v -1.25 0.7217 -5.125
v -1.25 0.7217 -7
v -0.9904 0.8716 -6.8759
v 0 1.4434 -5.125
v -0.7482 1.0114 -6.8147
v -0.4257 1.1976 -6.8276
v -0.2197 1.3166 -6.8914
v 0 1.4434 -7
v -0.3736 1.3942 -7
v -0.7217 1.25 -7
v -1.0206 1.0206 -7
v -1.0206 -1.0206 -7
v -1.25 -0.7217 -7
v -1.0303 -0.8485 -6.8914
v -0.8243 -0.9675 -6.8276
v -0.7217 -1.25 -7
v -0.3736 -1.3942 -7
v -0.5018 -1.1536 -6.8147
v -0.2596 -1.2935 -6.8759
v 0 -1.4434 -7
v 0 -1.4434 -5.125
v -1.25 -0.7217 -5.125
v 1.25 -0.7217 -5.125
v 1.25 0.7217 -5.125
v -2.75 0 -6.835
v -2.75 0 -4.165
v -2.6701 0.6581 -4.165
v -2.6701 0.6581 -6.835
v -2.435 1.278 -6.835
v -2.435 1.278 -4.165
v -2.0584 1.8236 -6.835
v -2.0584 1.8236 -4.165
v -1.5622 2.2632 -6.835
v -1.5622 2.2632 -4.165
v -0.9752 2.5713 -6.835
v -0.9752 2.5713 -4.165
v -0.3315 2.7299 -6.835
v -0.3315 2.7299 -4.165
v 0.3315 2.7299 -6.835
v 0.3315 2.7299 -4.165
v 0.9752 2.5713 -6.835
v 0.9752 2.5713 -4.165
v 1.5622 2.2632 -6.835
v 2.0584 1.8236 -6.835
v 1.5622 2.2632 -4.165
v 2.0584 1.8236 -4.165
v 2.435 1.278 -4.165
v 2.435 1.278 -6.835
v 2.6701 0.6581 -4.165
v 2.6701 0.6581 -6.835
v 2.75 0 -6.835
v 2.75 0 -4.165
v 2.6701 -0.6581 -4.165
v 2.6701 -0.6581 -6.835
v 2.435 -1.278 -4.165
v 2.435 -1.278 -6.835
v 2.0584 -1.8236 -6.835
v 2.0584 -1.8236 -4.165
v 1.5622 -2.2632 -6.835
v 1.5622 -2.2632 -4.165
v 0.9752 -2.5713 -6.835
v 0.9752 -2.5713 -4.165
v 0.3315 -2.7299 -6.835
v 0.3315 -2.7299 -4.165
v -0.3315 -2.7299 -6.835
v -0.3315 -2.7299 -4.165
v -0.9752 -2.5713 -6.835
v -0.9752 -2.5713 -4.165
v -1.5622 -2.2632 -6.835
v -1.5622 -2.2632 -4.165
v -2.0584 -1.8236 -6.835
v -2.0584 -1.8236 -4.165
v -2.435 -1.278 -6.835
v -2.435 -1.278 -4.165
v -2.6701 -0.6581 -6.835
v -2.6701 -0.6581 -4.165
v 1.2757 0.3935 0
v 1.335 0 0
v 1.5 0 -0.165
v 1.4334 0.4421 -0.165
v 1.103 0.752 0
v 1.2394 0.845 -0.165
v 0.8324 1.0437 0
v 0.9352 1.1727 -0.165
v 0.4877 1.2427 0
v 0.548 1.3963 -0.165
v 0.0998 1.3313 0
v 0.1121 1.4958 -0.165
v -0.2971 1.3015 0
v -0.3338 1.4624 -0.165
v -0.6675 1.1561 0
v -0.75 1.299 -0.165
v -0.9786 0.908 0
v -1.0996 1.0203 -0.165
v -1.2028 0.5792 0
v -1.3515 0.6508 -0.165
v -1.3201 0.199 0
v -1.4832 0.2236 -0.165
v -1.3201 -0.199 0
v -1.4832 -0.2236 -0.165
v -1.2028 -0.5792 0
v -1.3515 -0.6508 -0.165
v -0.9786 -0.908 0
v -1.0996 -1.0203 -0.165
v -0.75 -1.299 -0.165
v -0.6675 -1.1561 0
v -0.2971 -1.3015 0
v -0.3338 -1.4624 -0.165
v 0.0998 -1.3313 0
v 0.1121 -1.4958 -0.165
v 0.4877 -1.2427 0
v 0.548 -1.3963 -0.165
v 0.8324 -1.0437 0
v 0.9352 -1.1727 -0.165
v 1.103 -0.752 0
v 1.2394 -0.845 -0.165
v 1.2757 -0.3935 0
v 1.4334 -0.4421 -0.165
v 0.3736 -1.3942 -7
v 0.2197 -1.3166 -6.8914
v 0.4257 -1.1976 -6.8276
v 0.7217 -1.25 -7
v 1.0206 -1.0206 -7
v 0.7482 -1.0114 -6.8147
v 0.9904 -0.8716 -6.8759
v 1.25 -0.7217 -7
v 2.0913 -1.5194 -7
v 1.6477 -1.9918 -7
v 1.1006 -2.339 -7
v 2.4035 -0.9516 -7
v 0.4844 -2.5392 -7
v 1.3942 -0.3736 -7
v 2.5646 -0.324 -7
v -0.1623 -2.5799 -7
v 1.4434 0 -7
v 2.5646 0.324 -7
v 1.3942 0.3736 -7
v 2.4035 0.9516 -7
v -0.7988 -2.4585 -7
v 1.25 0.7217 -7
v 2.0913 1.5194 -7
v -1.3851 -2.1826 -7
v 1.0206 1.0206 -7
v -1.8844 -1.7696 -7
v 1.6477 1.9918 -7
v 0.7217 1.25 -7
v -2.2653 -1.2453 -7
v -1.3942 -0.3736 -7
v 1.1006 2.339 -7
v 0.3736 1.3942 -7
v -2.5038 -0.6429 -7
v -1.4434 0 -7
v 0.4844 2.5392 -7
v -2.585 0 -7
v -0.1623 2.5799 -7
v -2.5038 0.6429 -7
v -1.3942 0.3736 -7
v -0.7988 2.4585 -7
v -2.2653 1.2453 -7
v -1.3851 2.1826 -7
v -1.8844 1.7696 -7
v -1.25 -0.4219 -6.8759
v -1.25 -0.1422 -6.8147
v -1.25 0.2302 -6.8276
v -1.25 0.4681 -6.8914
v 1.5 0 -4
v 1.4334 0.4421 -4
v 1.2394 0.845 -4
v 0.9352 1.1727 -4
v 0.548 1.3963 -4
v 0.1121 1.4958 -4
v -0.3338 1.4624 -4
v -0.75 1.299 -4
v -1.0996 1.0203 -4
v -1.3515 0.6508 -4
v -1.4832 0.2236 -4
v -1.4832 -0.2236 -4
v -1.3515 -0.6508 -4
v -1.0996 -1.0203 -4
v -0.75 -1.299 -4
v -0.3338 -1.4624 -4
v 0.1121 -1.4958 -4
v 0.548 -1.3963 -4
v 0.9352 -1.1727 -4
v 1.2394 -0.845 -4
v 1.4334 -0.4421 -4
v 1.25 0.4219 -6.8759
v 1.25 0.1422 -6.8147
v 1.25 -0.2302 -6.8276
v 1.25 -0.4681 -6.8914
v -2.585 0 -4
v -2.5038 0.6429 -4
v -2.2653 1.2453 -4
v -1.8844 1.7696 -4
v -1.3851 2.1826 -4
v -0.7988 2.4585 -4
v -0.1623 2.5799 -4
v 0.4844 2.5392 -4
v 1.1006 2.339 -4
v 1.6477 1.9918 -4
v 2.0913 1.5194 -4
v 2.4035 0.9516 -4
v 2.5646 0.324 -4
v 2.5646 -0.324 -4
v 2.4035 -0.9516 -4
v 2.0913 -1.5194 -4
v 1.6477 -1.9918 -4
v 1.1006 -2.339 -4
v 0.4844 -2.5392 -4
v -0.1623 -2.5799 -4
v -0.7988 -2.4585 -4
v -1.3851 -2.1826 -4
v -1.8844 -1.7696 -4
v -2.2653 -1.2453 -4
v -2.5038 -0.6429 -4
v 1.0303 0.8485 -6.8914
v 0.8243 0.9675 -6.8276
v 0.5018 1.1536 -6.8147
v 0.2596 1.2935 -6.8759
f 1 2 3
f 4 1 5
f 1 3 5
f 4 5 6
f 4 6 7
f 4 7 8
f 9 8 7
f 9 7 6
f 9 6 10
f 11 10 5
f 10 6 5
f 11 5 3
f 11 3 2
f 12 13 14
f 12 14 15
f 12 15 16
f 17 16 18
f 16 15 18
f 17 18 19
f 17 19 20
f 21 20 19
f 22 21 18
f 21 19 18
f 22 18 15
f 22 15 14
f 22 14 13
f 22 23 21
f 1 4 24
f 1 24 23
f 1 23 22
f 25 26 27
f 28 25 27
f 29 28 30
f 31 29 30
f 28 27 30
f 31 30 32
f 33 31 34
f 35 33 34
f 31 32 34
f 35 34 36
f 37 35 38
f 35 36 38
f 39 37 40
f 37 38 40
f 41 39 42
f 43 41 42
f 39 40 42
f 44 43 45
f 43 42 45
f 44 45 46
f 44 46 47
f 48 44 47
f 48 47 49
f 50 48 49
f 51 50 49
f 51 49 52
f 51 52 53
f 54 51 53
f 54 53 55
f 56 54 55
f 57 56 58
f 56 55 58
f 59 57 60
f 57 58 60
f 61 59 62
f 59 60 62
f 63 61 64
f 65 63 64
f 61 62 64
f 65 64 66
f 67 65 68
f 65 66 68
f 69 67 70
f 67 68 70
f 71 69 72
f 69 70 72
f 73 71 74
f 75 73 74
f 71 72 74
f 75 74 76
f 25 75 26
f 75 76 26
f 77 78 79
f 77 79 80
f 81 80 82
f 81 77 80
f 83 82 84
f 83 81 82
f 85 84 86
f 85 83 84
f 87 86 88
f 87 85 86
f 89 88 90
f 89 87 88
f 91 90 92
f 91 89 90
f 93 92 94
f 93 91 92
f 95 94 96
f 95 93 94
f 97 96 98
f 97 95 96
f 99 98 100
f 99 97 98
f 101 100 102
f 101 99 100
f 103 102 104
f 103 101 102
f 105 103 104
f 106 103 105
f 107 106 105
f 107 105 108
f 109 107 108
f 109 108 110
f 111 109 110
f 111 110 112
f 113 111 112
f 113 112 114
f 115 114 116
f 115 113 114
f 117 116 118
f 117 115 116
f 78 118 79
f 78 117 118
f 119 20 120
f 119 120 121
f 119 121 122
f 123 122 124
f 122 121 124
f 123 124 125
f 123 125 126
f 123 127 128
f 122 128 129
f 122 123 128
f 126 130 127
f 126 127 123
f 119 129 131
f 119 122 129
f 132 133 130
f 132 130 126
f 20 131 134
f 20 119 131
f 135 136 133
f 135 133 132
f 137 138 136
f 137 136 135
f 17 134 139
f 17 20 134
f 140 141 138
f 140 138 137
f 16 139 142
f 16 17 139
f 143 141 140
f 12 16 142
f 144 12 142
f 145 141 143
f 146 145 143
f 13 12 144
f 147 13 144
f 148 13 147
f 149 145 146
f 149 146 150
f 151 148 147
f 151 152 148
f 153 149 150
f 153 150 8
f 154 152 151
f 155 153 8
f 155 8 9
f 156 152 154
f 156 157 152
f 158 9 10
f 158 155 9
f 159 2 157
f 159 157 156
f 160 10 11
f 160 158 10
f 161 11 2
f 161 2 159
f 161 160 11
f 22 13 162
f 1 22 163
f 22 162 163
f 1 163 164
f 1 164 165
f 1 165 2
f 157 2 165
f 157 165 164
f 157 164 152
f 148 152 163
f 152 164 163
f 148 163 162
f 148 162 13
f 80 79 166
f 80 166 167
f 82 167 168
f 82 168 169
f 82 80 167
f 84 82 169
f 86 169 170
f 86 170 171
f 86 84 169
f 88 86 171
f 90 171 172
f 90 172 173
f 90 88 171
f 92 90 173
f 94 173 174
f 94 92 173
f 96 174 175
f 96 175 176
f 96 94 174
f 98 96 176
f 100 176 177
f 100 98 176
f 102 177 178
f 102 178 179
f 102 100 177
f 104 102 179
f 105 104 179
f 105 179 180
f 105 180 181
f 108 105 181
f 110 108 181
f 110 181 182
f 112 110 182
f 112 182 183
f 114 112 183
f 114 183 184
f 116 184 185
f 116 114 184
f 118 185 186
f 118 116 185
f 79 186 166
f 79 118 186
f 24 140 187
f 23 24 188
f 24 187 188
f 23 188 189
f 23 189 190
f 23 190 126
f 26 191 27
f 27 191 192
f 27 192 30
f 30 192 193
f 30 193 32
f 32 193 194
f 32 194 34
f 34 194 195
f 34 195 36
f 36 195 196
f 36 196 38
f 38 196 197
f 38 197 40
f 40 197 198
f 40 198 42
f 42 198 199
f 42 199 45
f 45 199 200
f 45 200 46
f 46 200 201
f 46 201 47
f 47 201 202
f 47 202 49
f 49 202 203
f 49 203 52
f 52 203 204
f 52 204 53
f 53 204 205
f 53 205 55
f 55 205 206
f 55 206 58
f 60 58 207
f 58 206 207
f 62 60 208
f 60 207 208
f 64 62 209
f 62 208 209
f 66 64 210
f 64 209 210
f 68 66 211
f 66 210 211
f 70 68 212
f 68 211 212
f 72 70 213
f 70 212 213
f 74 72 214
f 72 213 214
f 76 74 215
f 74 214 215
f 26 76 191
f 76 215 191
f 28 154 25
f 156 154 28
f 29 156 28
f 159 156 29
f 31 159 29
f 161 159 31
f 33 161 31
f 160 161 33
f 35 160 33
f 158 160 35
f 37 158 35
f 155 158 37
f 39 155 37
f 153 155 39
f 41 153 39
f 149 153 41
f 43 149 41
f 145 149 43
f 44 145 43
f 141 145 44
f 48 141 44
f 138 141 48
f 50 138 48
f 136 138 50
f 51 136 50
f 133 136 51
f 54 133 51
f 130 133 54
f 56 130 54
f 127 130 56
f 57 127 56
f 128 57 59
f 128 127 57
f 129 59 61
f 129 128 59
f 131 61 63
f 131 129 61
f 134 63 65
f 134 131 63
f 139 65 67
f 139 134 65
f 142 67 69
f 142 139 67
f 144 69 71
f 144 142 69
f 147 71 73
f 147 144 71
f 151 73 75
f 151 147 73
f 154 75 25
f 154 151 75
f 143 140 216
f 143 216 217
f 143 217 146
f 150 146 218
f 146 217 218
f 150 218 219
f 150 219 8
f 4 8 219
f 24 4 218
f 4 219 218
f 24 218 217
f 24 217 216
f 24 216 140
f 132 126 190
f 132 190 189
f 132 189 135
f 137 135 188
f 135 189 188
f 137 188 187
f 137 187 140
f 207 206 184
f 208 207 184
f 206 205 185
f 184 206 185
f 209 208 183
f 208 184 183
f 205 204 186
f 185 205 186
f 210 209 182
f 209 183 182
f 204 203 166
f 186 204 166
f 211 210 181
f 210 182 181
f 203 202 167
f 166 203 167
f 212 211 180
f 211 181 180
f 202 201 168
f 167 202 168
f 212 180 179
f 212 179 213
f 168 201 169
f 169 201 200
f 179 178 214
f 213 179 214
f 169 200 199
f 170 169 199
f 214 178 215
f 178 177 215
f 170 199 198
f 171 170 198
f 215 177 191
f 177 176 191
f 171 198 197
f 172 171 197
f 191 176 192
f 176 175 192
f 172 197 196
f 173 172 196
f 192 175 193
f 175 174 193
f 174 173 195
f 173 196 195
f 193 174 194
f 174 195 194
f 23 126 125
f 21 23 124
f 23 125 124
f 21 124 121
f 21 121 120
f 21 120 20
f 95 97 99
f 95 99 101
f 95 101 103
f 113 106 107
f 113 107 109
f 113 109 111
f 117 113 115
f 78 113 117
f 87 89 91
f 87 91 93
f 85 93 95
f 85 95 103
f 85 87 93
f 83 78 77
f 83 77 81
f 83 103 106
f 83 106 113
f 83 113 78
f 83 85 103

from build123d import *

# Parameters (mm, degrees)
SKETCH1_R          = 1.5
EXTRUDE1_DEPTH     = 4
SKETCH6_R          = 2.75
EXTRUDE2_DEPTH     = 3
CUT_EXTRUDE1_DEPTH = 1.875
CHAMFER1_SIZE      = 0.165


with BuildPart() as part:
    # Sketch1 → Extrude1 (new body)
    with BuildSketch(Plane.XY):
        Circle(SKETCH1_R)
    extrude(amount=-EXTRUDE1_DEPTH)

    # Sketch6 → Extrude2 (add)
    with BuildSketch(Plane(origin=(0, 0, -4), x_dir=(-1, 0, 0), z_dir=(0, 0, -1))):
        Circle(SKETCH6_R)
    extrude(amount=EXTRUDE2_DEPTH)

    # Sketch7 → Cut-Extrude1 (cut)
    with BuildSketch(Plane(origin=(0, 0, -7), x_dir=(-1, 0, 0), z_dir=(0, 0, -1))):
        Polygon((0, 1.443375673), (-1.25, 0.721687836), (-1.25, -0.721687836), (0, -1.443375673), (1.25, -0.721687836), (1.25, 0.721687836), align=None)
    extrude(amount=-CUT_EXTRUDE1_DEPTH, mode=Mode.SUBTRACT)

    # Cut-Extrude2 cone 1 section (through the dimple's axis) → Cut-Extrude2 (revolve, cut)
    with BuildSketch(Plane(origin=(0, 0, -7), x_dir=(0, 1, 0), z_dir=(1, 0, 0))):
        Polygon((0, 0), (1.443375673, 0), (0, 1.443375673), align=None)
    revolve(axis=Axis((0, 0, -7), (0, 0, 1)), mode=Mode.SUBTRACT)

    # Chamfer1
    chamfer1_edges = [part.edges().sort_by_distance(p)[0] for p in [
        (-1.5, 0, 0),
        (2.75, 0, -4),
        (2.75, 0, -7),
    ]]
    chamfer(chamfer1_edges, length=CHAMFER1_SIZE)


solid = part.part
